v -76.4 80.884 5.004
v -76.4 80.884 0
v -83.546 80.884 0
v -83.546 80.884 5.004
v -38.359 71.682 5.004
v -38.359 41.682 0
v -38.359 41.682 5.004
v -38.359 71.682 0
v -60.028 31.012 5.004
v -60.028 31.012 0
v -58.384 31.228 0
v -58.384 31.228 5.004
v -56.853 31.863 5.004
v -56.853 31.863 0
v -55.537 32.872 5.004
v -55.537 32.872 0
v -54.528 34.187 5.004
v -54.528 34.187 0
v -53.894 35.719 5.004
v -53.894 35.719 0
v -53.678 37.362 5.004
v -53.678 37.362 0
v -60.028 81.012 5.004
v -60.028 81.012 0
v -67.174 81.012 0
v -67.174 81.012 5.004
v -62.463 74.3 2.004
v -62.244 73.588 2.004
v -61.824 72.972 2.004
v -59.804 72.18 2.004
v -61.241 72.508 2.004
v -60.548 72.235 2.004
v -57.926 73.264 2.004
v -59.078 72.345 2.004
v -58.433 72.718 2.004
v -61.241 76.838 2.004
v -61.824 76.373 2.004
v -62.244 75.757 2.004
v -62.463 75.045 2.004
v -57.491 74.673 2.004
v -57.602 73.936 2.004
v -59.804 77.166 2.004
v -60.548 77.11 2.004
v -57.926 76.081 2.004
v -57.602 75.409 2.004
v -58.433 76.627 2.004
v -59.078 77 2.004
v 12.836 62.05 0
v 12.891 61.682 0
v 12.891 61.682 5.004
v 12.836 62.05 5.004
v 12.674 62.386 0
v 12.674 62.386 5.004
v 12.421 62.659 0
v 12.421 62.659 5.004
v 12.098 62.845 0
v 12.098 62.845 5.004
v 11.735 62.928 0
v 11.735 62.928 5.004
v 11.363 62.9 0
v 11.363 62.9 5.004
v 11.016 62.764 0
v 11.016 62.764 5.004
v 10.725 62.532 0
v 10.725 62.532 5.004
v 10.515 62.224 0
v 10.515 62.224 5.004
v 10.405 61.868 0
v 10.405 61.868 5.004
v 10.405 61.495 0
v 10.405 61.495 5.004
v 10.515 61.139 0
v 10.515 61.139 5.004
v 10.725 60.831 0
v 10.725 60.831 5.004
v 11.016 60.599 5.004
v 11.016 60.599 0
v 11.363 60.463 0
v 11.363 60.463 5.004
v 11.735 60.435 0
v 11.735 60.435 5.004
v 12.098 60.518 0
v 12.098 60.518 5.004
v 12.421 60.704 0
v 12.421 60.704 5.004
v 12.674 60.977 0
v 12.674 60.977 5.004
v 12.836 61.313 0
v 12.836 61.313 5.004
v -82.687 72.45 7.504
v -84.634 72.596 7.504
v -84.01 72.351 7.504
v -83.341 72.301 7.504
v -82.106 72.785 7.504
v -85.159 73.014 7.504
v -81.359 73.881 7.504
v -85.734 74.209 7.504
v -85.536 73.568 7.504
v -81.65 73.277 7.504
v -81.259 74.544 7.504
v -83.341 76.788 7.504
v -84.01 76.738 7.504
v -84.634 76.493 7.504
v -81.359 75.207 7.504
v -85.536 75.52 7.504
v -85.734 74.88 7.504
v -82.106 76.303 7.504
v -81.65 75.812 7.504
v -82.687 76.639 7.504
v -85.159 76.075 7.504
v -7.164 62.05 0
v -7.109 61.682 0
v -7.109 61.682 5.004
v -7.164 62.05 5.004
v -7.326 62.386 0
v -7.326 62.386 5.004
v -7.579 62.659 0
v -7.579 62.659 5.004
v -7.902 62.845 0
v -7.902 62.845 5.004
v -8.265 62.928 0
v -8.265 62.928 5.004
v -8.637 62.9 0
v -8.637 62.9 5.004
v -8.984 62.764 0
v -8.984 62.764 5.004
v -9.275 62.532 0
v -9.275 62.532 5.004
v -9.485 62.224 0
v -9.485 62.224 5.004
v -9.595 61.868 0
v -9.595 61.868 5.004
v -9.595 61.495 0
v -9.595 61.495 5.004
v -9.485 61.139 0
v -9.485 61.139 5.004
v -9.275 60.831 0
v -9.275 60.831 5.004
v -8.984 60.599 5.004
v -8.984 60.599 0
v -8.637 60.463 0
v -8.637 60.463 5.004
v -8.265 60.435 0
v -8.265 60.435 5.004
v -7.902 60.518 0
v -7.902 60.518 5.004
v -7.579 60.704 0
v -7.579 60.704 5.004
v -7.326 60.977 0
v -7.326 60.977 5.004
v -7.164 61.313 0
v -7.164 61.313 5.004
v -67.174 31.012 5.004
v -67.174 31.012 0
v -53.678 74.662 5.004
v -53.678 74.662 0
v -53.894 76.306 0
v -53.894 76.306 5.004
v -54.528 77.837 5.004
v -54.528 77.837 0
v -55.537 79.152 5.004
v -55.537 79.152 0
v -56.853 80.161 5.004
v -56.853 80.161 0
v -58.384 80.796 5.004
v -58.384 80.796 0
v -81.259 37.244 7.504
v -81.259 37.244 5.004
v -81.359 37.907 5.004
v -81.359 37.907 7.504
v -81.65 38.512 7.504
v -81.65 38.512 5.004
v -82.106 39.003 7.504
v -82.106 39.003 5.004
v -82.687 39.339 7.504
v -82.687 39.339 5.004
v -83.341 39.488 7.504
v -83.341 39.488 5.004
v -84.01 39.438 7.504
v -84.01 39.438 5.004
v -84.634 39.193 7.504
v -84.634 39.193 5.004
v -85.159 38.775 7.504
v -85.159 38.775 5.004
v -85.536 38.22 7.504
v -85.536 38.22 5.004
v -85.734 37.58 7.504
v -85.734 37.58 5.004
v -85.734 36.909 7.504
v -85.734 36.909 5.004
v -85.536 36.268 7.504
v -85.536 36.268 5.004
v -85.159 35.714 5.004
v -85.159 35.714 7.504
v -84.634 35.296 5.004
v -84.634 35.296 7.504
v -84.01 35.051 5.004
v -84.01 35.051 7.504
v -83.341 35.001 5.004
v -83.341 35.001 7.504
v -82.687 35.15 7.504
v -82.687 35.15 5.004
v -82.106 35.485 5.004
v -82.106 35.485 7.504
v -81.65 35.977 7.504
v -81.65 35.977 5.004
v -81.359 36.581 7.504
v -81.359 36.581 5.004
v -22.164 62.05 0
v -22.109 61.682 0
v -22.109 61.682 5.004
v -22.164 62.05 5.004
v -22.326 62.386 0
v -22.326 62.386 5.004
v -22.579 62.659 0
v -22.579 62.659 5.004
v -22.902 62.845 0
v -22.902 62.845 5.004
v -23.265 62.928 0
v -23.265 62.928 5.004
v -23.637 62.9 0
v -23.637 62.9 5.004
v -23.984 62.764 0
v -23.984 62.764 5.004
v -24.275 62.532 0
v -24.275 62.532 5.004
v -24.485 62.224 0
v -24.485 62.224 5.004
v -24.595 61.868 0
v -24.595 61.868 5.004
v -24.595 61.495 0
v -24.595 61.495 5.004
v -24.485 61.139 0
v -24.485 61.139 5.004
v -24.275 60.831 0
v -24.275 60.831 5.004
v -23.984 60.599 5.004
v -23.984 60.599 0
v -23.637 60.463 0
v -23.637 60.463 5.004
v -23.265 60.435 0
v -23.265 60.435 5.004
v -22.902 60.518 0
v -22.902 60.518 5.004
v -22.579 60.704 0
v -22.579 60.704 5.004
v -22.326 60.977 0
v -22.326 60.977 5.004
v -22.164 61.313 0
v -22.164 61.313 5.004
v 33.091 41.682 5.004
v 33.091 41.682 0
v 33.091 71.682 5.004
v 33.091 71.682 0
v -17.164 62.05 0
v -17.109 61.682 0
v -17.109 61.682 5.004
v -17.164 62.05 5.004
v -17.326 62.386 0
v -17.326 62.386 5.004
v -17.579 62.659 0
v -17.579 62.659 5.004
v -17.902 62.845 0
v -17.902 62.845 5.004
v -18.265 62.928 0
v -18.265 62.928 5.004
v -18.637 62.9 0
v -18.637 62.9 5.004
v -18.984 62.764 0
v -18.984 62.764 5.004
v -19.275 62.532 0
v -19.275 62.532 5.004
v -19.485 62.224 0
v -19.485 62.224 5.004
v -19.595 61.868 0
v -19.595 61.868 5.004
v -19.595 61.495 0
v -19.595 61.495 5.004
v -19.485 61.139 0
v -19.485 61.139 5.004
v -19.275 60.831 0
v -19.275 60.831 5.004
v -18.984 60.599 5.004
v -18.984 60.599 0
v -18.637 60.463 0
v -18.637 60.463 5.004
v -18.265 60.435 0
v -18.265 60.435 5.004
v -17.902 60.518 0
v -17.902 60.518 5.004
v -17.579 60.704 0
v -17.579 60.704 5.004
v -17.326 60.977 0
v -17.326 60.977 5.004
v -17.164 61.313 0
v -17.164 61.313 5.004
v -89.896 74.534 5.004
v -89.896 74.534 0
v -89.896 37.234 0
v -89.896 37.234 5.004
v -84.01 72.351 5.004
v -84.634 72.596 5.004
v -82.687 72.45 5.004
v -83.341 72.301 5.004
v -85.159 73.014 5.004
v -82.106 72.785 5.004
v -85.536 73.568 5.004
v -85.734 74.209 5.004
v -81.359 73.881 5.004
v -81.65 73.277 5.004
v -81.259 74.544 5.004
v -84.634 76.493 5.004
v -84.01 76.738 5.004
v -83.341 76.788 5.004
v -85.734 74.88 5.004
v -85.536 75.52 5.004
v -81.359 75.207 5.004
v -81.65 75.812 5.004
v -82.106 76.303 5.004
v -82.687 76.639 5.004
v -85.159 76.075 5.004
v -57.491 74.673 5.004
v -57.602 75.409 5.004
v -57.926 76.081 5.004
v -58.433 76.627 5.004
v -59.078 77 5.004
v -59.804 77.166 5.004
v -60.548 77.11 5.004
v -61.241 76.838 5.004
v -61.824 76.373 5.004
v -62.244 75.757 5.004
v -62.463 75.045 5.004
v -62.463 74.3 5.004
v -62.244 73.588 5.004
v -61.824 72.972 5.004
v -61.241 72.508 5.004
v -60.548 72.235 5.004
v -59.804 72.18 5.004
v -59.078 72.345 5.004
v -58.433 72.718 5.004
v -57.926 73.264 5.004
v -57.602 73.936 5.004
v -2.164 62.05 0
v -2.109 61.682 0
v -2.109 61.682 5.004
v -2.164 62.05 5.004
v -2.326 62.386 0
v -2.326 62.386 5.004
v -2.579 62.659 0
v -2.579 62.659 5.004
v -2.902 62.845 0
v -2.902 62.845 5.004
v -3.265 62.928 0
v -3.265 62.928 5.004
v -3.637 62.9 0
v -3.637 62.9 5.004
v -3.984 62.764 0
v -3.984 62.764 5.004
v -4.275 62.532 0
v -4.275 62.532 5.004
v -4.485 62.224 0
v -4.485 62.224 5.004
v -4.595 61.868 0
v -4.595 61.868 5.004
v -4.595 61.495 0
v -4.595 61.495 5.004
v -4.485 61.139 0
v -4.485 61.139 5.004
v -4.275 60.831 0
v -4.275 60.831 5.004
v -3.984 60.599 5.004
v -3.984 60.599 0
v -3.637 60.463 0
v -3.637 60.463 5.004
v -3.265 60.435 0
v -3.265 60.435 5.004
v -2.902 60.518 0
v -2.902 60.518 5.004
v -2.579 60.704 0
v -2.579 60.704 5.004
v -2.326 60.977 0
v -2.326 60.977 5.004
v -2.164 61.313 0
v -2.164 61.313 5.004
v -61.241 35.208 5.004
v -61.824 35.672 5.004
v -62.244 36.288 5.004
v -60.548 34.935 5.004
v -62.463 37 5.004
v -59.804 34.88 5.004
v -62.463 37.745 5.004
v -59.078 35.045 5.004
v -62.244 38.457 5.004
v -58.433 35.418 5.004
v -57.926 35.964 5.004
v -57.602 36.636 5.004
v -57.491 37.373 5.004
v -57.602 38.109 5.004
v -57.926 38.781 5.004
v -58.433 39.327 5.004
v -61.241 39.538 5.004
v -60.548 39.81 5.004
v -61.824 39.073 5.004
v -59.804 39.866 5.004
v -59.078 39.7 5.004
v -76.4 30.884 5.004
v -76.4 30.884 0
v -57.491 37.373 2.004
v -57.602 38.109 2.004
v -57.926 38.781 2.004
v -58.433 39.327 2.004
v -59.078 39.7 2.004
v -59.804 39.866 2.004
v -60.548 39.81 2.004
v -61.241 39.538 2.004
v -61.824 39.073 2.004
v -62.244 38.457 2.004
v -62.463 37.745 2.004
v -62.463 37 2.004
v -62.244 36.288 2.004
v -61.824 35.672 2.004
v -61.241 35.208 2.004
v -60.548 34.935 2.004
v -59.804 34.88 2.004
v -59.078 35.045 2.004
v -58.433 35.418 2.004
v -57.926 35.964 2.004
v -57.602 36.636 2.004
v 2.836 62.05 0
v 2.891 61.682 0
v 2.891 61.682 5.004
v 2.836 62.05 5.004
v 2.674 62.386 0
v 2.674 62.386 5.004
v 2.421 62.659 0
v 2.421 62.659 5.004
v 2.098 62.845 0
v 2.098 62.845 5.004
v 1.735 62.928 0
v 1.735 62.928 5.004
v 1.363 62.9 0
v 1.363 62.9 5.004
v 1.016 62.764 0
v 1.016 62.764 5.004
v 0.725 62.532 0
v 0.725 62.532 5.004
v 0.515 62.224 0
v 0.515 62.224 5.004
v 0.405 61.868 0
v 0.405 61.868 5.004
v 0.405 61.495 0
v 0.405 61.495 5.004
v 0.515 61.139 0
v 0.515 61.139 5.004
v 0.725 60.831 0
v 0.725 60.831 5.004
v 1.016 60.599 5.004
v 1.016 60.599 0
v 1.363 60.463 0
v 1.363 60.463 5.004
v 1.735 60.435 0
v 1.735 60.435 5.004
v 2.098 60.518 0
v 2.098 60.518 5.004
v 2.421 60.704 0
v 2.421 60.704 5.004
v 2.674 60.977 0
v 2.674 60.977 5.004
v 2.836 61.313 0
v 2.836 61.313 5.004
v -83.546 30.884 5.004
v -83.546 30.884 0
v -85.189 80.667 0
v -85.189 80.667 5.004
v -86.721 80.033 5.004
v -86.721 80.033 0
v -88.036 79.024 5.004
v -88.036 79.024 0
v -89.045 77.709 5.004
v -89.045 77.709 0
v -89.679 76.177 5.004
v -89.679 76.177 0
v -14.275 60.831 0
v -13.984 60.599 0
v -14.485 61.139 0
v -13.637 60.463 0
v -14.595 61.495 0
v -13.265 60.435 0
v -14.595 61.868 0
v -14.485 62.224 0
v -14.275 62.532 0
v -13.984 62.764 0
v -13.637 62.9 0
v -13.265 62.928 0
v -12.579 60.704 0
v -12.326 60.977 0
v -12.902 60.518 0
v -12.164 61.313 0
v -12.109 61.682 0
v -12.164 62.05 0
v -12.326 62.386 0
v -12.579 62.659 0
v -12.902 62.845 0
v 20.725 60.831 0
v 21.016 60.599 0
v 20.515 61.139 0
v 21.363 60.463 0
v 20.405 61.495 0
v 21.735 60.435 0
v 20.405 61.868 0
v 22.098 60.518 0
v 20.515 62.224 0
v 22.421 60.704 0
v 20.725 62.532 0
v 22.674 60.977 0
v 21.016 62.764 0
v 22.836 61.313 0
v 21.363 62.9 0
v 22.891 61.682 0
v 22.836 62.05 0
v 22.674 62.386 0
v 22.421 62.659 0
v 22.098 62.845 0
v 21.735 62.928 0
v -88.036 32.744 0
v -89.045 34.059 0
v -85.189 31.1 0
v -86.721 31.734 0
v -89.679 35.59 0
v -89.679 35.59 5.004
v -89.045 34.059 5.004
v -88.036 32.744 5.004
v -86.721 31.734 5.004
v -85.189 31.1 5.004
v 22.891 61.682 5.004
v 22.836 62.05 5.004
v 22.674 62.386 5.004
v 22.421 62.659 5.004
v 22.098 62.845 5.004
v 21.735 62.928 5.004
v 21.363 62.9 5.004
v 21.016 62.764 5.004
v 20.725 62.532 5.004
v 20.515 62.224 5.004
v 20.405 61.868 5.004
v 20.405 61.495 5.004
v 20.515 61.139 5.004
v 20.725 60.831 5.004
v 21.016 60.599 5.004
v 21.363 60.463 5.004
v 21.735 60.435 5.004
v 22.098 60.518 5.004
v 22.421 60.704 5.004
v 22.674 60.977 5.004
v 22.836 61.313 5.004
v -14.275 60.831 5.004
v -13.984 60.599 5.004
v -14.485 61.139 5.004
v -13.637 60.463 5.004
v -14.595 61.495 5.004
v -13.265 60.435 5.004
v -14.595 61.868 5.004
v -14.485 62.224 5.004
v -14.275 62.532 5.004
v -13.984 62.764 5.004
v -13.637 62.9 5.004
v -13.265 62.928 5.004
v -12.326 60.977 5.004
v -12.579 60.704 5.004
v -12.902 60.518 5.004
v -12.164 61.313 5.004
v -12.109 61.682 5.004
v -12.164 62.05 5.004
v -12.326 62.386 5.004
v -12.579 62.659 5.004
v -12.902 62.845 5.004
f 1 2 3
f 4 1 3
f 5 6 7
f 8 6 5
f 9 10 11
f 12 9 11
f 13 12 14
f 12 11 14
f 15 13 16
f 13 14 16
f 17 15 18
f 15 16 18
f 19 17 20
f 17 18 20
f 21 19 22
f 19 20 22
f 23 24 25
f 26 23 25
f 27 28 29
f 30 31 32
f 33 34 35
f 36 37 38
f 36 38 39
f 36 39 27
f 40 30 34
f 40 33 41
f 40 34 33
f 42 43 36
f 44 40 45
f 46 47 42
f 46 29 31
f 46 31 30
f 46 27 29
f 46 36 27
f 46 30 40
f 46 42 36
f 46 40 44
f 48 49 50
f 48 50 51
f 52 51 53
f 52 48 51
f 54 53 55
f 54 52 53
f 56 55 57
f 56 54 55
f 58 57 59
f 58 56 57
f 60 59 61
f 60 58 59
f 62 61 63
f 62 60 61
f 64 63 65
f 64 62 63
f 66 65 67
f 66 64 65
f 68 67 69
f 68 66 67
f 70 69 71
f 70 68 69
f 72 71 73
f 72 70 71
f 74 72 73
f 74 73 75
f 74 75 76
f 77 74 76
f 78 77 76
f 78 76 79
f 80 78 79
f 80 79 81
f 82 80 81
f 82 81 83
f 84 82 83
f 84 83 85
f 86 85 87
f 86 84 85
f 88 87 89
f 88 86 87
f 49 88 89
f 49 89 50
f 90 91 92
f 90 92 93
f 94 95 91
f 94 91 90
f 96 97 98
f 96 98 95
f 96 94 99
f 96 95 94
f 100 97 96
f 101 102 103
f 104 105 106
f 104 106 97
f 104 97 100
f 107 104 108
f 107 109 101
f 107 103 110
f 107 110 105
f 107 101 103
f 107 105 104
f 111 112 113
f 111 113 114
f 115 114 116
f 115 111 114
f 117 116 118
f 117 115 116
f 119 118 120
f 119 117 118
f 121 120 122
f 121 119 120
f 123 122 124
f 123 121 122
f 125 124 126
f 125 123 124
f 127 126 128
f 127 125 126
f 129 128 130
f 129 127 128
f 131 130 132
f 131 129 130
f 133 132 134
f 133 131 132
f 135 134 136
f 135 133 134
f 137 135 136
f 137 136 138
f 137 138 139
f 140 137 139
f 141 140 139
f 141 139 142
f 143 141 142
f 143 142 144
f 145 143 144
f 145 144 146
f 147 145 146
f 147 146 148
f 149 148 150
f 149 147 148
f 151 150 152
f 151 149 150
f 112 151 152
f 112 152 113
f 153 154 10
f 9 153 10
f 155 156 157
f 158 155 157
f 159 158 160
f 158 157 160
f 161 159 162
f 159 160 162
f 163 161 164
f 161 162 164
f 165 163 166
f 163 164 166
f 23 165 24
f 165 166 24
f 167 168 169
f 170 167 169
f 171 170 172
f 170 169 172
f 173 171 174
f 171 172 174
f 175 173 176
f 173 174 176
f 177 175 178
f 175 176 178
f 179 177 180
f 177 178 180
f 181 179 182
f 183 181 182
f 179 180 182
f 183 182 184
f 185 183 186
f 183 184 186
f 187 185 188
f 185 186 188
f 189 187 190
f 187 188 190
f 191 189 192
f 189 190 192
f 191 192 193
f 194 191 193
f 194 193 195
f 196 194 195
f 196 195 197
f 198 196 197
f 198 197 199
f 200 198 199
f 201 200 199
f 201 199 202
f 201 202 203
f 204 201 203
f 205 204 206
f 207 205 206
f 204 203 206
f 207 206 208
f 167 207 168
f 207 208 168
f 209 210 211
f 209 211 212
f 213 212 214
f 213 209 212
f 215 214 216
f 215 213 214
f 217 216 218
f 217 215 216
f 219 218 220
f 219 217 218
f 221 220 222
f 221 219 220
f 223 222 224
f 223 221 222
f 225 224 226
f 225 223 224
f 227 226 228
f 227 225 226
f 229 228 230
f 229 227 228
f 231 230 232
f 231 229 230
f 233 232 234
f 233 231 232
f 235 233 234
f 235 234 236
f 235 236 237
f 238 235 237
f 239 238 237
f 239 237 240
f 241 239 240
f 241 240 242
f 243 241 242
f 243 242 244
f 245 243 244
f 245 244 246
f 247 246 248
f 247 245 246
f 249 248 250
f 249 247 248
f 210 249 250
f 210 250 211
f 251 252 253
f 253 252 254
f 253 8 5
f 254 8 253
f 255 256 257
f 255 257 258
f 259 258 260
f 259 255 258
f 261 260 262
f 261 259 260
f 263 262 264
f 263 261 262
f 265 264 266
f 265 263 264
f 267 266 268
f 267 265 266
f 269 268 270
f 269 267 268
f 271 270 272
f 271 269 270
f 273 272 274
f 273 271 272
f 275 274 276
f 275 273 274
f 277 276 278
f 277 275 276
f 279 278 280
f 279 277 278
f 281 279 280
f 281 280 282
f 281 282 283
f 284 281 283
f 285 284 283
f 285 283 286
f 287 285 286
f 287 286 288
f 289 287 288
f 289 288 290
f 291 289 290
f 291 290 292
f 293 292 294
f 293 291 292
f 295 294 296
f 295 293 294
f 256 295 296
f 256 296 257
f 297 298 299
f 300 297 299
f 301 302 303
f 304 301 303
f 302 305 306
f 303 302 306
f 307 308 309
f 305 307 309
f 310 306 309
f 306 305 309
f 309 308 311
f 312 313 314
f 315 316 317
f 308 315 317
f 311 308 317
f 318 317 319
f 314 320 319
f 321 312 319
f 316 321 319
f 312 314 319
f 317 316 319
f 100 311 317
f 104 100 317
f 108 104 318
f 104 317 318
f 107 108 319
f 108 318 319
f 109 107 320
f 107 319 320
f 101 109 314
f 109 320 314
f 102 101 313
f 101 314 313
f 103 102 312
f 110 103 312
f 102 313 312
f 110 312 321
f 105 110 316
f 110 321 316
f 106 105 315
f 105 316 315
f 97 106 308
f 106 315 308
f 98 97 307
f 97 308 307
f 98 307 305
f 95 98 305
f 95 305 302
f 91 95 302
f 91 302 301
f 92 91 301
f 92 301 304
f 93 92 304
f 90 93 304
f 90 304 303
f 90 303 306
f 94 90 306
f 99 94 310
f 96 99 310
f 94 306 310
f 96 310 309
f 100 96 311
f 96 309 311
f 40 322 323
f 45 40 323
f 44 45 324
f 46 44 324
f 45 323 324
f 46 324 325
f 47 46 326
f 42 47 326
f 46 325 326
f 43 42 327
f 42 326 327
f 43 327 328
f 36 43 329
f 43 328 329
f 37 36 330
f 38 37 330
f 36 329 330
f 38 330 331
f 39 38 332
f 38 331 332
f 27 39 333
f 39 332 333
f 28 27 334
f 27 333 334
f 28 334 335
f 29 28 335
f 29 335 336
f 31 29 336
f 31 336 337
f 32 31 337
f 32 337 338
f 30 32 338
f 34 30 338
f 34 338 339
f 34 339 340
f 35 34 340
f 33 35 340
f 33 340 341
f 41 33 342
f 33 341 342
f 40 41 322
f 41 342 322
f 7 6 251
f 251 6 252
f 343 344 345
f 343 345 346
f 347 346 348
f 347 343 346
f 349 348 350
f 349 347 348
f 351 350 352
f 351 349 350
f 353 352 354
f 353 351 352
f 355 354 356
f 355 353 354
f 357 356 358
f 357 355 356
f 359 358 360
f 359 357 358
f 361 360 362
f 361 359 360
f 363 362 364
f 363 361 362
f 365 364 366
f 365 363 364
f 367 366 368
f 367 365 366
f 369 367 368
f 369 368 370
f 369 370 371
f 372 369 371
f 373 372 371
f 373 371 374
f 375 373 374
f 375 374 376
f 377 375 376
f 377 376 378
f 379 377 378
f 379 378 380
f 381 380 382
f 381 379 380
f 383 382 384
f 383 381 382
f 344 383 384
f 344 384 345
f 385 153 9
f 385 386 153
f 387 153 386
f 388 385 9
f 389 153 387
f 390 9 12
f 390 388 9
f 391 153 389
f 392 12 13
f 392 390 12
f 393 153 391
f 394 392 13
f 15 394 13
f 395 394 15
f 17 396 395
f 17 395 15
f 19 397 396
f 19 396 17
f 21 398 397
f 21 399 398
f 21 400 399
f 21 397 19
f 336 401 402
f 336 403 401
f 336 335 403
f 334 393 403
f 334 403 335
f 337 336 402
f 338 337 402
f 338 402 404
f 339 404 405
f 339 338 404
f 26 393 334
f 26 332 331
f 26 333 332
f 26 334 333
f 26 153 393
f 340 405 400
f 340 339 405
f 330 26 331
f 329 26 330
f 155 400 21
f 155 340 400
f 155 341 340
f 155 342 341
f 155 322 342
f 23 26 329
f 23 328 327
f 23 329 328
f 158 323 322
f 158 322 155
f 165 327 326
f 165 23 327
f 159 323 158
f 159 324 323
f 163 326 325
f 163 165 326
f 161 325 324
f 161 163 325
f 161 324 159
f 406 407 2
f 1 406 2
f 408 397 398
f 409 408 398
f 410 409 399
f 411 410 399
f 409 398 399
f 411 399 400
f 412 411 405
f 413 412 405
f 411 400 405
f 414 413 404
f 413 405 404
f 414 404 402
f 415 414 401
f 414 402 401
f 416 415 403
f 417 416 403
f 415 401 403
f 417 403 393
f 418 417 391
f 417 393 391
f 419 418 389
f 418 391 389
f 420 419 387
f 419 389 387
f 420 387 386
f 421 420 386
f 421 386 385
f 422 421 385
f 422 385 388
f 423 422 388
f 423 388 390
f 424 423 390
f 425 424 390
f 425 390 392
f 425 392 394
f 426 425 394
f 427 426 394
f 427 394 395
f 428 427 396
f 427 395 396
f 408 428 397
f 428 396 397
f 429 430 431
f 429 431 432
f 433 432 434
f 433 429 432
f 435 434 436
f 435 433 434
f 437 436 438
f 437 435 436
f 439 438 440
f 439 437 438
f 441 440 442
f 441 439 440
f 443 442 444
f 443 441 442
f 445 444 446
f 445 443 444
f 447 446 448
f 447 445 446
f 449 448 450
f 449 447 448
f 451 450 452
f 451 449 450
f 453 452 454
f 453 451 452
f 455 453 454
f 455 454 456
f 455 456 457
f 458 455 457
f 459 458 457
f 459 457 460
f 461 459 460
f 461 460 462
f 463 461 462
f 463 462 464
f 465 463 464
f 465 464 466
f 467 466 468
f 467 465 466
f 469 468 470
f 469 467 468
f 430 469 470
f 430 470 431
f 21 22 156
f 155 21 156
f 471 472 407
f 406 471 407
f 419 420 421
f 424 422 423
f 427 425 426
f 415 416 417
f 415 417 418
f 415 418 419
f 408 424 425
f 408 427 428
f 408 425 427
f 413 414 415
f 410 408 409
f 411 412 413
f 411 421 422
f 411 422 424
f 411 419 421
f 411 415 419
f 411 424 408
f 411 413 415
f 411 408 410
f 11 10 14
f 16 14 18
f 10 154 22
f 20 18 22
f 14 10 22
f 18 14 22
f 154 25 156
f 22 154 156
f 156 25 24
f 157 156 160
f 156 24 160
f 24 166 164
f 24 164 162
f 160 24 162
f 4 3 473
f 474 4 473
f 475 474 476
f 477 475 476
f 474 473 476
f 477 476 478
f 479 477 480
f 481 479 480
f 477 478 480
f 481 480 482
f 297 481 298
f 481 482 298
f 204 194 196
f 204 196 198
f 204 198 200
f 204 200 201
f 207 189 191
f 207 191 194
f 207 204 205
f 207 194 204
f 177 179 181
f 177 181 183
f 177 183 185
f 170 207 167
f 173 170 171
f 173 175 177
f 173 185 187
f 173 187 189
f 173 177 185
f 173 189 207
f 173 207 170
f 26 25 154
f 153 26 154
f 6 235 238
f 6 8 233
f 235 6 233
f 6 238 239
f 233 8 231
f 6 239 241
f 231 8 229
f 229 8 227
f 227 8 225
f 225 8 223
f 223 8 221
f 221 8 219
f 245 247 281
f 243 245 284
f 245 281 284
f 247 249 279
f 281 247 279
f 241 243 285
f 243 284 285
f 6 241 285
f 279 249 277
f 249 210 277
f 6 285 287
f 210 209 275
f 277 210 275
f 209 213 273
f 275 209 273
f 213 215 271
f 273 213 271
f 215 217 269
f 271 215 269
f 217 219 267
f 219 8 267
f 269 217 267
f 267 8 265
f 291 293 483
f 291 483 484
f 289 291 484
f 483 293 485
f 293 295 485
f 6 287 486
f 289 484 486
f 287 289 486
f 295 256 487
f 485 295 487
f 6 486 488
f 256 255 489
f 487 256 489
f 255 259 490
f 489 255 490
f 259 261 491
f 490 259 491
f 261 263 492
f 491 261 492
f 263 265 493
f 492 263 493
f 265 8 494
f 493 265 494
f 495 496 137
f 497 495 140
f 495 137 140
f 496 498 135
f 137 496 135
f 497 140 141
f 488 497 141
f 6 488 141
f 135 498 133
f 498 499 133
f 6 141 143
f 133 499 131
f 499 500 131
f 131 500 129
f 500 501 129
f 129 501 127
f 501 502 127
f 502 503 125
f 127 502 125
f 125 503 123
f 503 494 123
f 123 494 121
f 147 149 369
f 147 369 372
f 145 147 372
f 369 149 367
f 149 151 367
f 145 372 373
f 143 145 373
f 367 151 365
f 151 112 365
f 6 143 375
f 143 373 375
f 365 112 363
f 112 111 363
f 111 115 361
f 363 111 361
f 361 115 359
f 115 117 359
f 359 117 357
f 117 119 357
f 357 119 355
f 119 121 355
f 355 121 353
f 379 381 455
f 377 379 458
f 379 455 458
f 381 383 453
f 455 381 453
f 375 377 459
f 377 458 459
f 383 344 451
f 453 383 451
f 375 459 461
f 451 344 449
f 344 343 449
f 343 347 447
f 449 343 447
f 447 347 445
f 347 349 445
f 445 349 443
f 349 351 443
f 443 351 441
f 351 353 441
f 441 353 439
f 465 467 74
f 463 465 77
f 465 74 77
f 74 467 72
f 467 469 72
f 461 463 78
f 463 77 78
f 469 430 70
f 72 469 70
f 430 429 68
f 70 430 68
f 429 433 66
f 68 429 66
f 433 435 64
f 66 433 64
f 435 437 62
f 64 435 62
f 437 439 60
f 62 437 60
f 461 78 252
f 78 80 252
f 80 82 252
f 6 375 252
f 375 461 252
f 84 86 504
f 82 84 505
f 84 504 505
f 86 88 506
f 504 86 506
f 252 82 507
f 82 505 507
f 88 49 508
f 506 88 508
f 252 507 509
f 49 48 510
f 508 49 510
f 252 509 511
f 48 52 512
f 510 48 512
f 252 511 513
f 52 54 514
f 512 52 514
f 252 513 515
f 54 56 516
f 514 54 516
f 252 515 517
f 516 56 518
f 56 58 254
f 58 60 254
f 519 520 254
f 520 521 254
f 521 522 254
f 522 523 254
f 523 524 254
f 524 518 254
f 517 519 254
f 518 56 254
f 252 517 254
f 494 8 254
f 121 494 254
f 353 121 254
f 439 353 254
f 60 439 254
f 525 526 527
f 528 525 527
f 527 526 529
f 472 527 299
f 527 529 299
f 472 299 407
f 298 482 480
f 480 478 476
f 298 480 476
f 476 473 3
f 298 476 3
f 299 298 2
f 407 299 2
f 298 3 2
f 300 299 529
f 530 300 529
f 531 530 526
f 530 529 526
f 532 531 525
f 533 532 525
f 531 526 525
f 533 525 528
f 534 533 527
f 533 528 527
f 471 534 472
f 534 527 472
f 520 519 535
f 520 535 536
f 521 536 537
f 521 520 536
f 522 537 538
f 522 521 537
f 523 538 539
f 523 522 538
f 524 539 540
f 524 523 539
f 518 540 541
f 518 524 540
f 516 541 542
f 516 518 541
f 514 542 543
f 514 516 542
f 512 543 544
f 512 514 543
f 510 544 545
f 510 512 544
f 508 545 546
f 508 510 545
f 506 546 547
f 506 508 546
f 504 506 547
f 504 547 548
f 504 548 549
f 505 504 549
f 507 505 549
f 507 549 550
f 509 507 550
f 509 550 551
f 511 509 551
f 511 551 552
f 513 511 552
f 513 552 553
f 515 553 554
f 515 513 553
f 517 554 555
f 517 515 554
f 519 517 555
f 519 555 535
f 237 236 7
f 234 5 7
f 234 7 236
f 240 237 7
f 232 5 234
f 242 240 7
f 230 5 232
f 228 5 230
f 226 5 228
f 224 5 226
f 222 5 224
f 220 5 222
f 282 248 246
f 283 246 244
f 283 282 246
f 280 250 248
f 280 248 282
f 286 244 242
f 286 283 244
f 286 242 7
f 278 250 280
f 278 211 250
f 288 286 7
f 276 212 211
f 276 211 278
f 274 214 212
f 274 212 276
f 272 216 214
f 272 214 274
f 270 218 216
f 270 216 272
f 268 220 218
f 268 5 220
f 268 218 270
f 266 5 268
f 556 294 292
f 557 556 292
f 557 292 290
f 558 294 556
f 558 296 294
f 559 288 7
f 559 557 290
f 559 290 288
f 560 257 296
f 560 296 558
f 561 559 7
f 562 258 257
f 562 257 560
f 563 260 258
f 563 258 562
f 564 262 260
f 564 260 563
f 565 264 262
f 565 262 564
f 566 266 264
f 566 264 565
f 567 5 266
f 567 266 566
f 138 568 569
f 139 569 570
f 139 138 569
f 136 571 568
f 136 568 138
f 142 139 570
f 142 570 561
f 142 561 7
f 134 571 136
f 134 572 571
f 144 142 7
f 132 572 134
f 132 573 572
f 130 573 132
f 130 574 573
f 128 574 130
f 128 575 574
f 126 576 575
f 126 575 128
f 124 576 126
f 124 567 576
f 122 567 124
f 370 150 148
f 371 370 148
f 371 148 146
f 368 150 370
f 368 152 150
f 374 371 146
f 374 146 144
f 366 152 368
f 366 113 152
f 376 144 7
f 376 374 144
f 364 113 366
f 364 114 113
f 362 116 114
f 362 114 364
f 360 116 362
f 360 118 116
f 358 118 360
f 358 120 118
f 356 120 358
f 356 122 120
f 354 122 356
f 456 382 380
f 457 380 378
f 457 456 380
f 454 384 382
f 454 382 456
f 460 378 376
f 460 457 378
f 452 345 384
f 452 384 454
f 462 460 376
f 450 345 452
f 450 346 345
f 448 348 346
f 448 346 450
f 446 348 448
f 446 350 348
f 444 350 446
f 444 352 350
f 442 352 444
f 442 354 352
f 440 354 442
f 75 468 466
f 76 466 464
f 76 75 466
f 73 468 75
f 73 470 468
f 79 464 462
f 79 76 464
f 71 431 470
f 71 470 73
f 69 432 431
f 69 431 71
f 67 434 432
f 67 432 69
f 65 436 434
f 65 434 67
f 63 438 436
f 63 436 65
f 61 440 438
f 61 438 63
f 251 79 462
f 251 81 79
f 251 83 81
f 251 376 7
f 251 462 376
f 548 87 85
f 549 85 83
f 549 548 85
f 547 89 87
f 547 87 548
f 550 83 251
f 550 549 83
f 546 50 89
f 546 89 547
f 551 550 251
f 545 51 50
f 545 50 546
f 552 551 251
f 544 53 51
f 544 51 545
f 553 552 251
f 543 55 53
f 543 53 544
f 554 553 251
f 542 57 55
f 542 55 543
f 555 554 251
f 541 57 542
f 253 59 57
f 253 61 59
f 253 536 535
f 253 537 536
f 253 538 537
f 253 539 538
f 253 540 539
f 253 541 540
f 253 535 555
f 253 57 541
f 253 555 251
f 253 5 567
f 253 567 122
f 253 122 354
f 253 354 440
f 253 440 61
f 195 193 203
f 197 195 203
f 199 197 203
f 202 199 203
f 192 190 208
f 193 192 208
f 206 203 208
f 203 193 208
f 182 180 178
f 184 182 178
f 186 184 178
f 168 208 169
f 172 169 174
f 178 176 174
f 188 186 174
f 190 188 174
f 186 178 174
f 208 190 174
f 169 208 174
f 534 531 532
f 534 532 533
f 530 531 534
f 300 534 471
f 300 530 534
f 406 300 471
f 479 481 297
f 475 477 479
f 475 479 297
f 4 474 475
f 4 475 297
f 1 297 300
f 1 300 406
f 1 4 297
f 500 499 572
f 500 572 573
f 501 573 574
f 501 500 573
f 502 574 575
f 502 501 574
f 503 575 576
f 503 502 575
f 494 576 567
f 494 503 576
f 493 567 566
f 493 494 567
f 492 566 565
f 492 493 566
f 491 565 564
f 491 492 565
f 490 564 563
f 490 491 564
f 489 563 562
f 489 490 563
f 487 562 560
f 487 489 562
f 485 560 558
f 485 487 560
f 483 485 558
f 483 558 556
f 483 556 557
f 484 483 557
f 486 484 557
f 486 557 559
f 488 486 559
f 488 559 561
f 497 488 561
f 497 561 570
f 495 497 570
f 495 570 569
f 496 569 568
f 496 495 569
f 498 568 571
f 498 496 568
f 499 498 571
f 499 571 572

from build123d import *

# Parameters (mm, degrees)
F0_R     = 2.25
F1_DEPTH = 5.0038
F0_R_2   = 2.5
F0_W     = 71.4502
F0_H     = 30
F0_R_3   = 1.25
F2_R     = 2.25
F3_DEPTH = 2.5
F2_R_2   = 2.5
F4_DEPTH = 3


with BuildPart() as f1:
    # F0 (on Top) → F1 (new body)
    with BuildSketch(Plane.XY):
        with BuildLine():
            Line((-76.39965415, 80.8836642653), (-83.5455836892, 80.8836642653))
            ThreePointArc((-83.5455836892, 80.8836642653), (-88.0357117497, 79.0237923258), (-89.8955836892, 74.5336642653))
            Line((-89.8955836892, 74.5336642653), (-89.8955836892, 37.2336642653))
            ThreePointArc((-89.8955836892, 37.2336642653), (-88.0357117497, 32.7435362047), (-83.5455836892, 30.8836642653))
            Line((-83.5455836892, 30.8836642653), (-76.39965415, 30.8836642653))
            Line((-76.39965415, 30.8836642653), (-76.39965415, 80.8836642653))
        make_face()
        with Locations((-83.5455836892, 37.2336642653)):
            Circle(F0_R, mode=Mode.SUBTRACT)
        with Locations((-83.5455836892, 74.5336642653)):
            Circle(F0_R, mode=Mode.SUBTRACT)
        with Locations((-83.5455836892, 74.5336642653)):
            Circle(F0_R)
        with Locations((-83.5455836892, 37.2336642653)):
            Circle(F0_R)
    extrude(amount=F1_DEPTH)


with BuildPart() as f1b:
    # F0 (on Top) → F1, piece 2 (new body)
    with BuildSketch(Plane.XY):
        with BuildLine():
            Line((-67.1735417016, 31.0120239854), (-60.0276121624, 31.0120239854))
            ThreePointArc((-60.0276121624, 31.0120239854), (-55.5374841019, 32.8718959249), (-53.6776121624, 37.3620239854))
            Line((-53.6776121624, 37.3620239854), (-53.6776121624, 74.6620239854))
            ThreePointArc((-53.6776121624, 74.6620239854), (-55.5374841019, 79.1521520459), (-60.0276121624, 81.0120239854))
            Line((-60.0276121624, 81.0120239854), (-67.1735417016, 81.0120239854))
            Line((-67.1735417016, 81.0120239854), (-67.1735417016, 31.0120239854))
        make_face()
        with Locations((-60.0276121624, 37.3620239854)):
            Circle(F0_R_2, mode=Mode.SUBTRACT)
        with Locations((-60.0276121624, 74.6620239854)):
            Circle(F0_R_2, mode=Mode.SUBTRACT)
        with Locations((-60.0276121624, 37.3620239854)):
            Circle(F0_R_2)
        with Locations((-60.0276121624, 74.6620239854)):
            Circle(F0_R_2)
    extrude(amount=F1_DEPTH)

    # F2 (on face) → F4 (cut)
    with BuildSketch(Plane.XY.offset(5.0038)):
        with Locations((-59.9912900273, 74.6725738212)):
            Circle(F2_R_2)
        with Locations((-59.9912900273, 37.3725738212)):
            Circle(F2_R_2)
    extrude(amount=-F4_DEPTH, mode=Mode.SUBTRACT)


with BuildPart() as f1c:
    # F0 (on Top) → F1, piece 3 (new body)
    with BuildSketch(Plane.XY):
        with Locations((-2.6336273854, 56.6815690561)):
            Rectangle(F0_W, F0_H)
        with Locations((-23.3587273854, 61.6815690561)):
            Circle(F0_R_3, mode=Mode.SUBTRACT)
        with Locations((-18.3587273854, 61.6815690561)):
            Circle(F0_R_3, mode=Mode.SUBTRACT)
        with Locations((-13.3587273854, 61.6815690561)):
            Circle(F0_R_3, mode=Mode.SUBTRACT)
        with Locations((-8.3587273854, 61.6815690561)):
            Circle(F0_R_3, mode=Mode.SUBTRACT)
        with Locations((-3.3587273854, 61.6815690561)):
            Circle(F0_R_3, mode=Mode.SUBTRACT)
        with Locations((1.6412726146, 61.6815690561)):
            Circle(F0_R_3, mode=Mode.SUBTRACT)
        with Locations((11.6412726146, 61.6815690561)):
            Circle(F0_R_3, mode=Mode.SUBTRACT)
        with Locations((21.6412726146, 61.6815690561)):
            Circle(F0_R_3, mode=Mode.SUBTRACT)
    extrude(amount=F1_DEPTH)


with BuildPart() as f3:
    # F2 (on face) → F3 (new body)
    with BuildSketch(Plane.XY.offset(5.0038)):
        with Locations((-83.5092615541, 74.5442141011)):
            Circle(F2_R)
    extrude(amount=F3_DEPTH)


with BuildPart() as f3b:
    # F2 (on face) → F3, piece 2 (new body)
    with BuildSketch(Plane.XY.offset(5.0038)):
        with Locations((-83.5092615541, 37.2442141011)):
            Circle(F2_R)
    extrude(amount=F3_DEPTH)


solid = Compound([f1.part, f1b.part, f1c.part, f3.part, f3b.part])
